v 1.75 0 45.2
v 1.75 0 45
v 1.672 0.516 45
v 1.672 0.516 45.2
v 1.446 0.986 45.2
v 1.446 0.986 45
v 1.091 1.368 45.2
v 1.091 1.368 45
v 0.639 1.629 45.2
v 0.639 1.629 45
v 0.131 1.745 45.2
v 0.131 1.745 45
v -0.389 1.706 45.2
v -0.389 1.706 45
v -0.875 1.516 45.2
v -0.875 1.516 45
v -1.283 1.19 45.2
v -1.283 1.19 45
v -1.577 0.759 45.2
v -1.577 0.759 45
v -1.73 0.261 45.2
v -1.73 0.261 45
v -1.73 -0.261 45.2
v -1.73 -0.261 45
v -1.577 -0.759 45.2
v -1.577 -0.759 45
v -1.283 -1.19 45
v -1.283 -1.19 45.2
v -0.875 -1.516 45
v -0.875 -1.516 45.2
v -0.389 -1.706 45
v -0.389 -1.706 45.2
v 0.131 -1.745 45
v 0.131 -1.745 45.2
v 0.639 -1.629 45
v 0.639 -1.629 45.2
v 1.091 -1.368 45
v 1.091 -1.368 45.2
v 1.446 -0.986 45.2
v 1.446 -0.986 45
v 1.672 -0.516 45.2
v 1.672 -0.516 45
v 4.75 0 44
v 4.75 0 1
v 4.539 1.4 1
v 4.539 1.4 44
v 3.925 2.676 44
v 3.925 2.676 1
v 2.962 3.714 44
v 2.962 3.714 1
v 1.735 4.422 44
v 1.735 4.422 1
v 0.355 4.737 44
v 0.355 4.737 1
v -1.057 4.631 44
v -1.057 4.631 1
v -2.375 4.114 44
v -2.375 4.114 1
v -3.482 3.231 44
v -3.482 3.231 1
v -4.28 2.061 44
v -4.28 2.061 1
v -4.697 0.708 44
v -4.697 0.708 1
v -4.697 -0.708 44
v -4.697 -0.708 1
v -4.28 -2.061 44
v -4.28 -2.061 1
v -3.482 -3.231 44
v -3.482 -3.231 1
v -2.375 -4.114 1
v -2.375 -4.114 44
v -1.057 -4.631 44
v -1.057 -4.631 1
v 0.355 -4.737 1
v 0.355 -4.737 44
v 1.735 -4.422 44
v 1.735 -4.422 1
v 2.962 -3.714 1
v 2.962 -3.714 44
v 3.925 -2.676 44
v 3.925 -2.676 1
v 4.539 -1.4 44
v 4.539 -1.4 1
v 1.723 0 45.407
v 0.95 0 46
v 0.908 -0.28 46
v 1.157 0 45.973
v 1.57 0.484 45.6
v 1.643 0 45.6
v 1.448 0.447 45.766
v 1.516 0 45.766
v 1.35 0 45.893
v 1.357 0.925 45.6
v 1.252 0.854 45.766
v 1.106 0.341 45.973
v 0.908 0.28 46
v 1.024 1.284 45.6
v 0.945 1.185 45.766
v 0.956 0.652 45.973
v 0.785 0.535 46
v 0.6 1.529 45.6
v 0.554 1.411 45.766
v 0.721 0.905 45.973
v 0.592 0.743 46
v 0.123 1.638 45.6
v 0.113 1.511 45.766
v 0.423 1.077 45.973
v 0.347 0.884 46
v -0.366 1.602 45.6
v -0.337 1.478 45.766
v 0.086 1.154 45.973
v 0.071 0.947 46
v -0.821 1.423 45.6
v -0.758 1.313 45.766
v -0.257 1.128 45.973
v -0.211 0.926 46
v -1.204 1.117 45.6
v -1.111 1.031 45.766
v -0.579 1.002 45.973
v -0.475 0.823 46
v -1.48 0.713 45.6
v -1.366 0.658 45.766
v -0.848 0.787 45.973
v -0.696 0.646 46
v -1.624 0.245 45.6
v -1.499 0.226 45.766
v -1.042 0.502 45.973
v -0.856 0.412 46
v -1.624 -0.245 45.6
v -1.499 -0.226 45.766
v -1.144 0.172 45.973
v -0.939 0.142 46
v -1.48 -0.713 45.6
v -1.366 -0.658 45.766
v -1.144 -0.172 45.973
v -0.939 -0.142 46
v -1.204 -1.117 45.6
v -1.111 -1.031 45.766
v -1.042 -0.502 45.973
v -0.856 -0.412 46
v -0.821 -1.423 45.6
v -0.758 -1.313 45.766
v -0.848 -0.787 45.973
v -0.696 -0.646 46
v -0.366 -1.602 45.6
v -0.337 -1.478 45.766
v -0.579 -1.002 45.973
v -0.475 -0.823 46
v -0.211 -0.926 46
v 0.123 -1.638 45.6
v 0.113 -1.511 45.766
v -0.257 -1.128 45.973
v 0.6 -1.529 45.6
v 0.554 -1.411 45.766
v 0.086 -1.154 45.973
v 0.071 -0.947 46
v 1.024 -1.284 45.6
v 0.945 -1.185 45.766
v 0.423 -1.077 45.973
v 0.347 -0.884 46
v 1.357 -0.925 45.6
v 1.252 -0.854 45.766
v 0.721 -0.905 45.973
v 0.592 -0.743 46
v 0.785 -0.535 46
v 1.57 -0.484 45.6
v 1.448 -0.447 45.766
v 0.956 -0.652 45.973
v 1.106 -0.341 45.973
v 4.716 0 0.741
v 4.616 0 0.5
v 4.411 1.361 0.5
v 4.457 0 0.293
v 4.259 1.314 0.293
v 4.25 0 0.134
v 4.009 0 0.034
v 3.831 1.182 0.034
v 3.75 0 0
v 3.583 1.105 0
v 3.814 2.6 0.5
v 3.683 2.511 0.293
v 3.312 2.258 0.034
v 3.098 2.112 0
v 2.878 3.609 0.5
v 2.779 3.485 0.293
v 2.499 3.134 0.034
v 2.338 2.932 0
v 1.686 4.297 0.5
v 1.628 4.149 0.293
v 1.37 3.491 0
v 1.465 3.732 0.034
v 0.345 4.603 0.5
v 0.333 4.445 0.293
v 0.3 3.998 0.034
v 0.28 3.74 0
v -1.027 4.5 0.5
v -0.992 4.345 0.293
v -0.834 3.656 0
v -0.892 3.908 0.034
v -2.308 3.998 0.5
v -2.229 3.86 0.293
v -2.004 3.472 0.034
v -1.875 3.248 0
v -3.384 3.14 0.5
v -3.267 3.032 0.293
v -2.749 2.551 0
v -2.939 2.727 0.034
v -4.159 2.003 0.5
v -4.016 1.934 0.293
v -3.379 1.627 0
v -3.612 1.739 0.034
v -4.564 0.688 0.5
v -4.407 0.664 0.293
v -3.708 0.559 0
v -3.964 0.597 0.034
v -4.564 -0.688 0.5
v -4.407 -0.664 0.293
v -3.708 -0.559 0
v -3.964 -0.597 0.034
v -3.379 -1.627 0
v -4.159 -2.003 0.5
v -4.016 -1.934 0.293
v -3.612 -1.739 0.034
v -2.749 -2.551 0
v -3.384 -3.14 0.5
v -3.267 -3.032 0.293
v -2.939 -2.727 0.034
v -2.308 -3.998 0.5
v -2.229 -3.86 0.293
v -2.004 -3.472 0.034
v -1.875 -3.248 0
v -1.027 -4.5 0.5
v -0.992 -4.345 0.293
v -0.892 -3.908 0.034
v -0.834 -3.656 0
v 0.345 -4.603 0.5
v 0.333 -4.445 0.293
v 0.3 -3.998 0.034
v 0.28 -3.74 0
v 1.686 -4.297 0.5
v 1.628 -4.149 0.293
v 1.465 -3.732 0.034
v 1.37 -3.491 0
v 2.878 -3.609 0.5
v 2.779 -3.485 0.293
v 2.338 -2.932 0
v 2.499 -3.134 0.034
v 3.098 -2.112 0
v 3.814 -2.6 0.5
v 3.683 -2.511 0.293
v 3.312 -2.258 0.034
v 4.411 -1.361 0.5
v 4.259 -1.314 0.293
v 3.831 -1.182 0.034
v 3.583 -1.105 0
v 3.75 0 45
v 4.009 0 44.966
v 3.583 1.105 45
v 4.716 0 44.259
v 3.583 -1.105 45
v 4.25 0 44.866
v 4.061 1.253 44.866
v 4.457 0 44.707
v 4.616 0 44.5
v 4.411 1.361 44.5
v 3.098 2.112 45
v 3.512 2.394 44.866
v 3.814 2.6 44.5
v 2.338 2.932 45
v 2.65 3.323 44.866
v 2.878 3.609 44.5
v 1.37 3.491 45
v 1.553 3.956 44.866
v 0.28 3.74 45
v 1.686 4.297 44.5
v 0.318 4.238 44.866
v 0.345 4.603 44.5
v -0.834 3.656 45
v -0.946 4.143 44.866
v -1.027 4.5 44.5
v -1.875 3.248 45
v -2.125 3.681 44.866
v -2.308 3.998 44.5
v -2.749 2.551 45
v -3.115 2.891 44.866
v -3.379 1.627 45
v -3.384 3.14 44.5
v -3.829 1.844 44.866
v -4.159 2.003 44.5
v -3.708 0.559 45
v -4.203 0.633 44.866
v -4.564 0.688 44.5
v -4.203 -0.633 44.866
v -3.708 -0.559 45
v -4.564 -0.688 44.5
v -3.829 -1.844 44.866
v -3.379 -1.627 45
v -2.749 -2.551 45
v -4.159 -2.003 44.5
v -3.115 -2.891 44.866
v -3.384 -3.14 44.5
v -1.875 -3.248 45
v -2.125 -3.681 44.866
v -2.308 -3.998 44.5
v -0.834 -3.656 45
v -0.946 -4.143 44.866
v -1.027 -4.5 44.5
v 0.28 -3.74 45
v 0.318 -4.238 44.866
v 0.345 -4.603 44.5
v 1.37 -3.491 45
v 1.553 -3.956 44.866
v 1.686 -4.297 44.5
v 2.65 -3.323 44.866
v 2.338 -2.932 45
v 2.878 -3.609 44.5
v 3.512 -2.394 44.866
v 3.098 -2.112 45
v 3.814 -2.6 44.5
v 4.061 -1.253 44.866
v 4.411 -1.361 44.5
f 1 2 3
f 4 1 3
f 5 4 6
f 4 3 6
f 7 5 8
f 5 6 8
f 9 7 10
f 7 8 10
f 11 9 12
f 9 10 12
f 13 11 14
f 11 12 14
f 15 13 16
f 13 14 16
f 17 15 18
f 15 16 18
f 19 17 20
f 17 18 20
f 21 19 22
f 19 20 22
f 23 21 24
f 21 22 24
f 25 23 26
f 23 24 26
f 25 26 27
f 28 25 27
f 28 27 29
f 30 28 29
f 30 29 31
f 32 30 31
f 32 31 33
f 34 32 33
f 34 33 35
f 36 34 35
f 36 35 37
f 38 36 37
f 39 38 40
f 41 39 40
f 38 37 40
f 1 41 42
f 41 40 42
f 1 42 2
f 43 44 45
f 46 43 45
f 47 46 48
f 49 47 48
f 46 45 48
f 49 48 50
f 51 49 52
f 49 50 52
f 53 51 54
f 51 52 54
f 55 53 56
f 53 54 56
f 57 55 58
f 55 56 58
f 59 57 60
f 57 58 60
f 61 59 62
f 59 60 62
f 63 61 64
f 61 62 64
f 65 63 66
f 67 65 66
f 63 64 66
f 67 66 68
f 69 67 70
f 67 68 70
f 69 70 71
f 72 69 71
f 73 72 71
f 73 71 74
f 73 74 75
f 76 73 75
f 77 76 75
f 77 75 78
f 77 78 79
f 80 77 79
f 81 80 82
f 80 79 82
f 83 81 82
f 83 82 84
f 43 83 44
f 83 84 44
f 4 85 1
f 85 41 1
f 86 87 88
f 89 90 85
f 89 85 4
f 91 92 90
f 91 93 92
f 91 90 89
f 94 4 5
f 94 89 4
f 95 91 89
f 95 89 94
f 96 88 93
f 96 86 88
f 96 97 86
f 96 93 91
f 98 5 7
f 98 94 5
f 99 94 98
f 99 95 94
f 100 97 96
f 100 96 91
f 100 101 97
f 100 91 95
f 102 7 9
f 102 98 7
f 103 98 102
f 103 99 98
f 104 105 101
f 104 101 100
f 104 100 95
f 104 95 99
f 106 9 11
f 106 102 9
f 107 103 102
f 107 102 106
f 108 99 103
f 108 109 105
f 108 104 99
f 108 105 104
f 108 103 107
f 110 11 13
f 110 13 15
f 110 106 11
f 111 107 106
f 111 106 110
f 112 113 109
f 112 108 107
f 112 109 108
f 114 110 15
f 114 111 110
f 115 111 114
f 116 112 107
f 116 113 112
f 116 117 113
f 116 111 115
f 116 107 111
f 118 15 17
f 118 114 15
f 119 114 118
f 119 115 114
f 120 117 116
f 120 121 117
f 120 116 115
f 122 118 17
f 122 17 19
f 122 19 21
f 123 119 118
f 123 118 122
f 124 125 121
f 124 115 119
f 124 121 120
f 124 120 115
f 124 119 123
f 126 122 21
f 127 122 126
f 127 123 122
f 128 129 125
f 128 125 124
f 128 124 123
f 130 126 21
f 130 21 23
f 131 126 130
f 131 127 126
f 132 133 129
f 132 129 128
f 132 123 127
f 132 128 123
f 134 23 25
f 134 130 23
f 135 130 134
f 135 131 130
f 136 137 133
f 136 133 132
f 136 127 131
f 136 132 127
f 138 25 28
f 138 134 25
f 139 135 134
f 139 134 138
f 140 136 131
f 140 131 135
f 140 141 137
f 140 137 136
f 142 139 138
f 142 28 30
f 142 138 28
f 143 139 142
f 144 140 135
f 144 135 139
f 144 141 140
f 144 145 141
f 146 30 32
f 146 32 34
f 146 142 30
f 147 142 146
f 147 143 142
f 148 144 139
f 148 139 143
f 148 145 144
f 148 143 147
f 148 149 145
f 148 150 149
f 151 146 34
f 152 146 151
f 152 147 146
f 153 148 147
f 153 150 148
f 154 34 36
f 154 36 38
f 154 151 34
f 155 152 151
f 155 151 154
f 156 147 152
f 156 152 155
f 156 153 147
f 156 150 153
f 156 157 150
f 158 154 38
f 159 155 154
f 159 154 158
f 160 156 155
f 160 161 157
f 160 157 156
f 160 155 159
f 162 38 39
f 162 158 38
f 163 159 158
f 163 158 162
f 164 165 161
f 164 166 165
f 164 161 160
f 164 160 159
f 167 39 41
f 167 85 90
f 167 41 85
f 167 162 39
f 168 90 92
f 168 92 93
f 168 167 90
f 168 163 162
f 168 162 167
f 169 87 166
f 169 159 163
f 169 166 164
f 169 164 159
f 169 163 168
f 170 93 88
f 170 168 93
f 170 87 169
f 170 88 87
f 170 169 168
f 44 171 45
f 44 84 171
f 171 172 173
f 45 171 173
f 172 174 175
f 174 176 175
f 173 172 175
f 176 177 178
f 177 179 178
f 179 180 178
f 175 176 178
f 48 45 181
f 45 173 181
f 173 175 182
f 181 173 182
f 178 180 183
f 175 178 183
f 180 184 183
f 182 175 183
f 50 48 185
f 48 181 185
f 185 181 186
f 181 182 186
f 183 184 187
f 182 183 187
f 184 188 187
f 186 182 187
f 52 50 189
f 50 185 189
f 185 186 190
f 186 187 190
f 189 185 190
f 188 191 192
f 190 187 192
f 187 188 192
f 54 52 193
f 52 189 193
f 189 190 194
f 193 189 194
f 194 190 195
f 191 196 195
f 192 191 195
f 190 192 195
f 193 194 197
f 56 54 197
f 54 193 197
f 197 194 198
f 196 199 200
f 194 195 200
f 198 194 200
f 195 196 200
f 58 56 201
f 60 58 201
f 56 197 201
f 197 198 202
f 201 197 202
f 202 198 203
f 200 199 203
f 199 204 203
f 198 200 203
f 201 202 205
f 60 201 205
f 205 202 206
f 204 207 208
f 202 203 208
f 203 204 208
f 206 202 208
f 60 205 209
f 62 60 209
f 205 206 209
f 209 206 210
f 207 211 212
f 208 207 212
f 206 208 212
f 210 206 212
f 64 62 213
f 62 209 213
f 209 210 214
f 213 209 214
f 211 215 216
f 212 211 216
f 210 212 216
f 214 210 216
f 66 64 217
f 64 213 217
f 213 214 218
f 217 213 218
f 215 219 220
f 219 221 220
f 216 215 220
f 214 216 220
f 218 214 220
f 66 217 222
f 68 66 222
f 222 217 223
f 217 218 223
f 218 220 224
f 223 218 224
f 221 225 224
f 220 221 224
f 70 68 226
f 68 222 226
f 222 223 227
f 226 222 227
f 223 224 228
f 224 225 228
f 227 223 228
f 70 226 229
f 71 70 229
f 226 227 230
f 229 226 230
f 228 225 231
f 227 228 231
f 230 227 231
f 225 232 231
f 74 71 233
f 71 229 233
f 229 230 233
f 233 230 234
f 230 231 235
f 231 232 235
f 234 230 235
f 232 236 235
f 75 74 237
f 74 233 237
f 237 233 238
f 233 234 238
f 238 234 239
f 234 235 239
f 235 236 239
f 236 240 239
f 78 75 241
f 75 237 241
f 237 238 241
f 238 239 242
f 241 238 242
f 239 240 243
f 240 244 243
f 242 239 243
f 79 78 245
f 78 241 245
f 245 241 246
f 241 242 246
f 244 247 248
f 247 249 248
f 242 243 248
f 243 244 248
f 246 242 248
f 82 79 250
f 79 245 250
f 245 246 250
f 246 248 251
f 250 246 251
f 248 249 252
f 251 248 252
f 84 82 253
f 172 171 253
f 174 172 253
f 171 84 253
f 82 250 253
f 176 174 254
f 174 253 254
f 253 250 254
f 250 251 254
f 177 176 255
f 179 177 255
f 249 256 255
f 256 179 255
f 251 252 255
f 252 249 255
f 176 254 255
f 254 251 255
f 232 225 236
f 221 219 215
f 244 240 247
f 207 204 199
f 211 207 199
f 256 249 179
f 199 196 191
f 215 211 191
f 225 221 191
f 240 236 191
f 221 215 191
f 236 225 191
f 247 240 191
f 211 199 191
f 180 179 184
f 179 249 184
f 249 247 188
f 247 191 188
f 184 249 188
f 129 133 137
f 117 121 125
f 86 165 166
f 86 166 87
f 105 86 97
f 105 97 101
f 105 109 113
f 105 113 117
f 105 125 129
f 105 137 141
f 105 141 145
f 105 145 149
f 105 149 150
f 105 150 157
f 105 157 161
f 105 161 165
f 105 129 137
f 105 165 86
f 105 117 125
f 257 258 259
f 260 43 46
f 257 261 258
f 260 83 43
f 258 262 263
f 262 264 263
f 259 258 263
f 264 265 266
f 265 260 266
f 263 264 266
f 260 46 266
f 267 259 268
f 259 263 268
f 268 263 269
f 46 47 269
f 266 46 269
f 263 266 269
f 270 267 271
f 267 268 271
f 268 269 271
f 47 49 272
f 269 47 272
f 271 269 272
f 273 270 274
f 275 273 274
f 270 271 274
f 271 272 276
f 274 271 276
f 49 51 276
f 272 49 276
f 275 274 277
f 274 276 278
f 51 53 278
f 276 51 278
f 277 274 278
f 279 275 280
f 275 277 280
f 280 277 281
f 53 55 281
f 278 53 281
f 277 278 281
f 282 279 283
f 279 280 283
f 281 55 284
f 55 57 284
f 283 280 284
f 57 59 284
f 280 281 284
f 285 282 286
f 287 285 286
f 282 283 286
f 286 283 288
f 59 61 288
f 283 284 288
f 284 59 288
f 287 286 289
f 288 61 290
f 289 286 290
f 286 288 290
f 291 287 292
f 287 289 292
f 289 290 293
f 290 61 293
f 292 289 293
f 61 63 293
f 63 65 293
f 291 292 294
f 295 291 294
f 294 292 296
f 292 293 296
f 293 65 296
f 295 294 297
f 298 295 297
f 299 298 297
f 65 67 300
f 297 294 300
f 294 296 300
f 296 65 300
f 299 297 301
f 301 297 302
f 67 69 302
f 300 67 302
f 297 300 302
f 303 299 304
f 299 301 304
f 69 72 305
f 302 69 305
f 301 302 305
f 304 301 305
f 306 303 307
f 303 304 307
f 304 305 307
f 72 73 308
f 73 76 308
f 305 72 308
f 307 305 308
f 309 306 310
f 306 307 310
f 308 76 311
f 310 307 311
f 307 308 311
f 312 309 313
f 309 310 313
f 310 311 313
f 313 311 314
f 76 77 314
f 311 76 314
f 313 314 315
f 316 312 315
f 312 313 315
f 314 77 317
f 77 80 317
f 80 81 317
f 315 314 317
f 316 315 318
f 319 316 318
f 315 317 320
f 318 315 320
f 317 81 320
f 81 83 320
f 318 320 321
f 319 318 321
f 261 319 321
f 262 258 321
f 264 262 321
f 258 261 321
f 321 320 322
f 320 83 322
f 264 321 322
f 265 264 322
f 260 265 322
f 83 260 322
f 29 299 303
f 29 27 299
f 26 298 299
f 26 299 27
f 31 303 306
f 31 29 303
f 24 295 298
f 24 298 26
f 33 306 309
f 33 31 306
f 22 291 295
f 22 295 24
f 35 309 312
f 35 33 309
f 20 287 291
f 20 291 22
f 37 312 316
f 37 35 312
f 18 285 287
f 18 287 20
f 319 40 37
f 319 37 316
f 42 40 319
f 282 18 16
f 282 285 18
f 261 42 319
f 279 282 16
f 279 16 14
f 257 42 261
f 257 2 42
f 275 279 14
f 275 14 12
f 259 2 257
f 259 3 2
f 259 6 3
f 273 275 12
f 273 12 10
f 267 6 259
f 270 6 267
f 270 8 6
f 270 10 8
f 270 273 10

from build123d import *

# Parameters (mm, degrees)
F0_R     = 4.75
F1_DEPTH = 45
F2_R     = 1.75
F3_DEPTH = 1
F4_R     = 0.8
F5_R     = 1


with BuildPart() as f1:
    # F0 (on Top) → F1 (new body)
    with BuildSketch(Plane.XY):
        Circle(F0_R)
    extrude(amount=F1_DEPTH)

    # F2 (on face) → F3 (join)
    with BuildSketch(Plane.XY.offset(45)):
        Circle(F2_R)
    extrude(amount=F3_DEPTH)

    # F4
    f4_edges = [f1.edges().sort_by_distance(p)[0] for p in [
        (-1.75, 0, 46),
    ]]
    fillet(f4_edges, radius=F4_R)

    # F5
    f5_edges = [f1.edges().sort_by_distance(p)[0] for p in [
        (-4.75, 0, 45),
        (-4.75, 0, 0),
    ]]
    fillet(f5_edges, radius=F5_R)


solid = f1.part
